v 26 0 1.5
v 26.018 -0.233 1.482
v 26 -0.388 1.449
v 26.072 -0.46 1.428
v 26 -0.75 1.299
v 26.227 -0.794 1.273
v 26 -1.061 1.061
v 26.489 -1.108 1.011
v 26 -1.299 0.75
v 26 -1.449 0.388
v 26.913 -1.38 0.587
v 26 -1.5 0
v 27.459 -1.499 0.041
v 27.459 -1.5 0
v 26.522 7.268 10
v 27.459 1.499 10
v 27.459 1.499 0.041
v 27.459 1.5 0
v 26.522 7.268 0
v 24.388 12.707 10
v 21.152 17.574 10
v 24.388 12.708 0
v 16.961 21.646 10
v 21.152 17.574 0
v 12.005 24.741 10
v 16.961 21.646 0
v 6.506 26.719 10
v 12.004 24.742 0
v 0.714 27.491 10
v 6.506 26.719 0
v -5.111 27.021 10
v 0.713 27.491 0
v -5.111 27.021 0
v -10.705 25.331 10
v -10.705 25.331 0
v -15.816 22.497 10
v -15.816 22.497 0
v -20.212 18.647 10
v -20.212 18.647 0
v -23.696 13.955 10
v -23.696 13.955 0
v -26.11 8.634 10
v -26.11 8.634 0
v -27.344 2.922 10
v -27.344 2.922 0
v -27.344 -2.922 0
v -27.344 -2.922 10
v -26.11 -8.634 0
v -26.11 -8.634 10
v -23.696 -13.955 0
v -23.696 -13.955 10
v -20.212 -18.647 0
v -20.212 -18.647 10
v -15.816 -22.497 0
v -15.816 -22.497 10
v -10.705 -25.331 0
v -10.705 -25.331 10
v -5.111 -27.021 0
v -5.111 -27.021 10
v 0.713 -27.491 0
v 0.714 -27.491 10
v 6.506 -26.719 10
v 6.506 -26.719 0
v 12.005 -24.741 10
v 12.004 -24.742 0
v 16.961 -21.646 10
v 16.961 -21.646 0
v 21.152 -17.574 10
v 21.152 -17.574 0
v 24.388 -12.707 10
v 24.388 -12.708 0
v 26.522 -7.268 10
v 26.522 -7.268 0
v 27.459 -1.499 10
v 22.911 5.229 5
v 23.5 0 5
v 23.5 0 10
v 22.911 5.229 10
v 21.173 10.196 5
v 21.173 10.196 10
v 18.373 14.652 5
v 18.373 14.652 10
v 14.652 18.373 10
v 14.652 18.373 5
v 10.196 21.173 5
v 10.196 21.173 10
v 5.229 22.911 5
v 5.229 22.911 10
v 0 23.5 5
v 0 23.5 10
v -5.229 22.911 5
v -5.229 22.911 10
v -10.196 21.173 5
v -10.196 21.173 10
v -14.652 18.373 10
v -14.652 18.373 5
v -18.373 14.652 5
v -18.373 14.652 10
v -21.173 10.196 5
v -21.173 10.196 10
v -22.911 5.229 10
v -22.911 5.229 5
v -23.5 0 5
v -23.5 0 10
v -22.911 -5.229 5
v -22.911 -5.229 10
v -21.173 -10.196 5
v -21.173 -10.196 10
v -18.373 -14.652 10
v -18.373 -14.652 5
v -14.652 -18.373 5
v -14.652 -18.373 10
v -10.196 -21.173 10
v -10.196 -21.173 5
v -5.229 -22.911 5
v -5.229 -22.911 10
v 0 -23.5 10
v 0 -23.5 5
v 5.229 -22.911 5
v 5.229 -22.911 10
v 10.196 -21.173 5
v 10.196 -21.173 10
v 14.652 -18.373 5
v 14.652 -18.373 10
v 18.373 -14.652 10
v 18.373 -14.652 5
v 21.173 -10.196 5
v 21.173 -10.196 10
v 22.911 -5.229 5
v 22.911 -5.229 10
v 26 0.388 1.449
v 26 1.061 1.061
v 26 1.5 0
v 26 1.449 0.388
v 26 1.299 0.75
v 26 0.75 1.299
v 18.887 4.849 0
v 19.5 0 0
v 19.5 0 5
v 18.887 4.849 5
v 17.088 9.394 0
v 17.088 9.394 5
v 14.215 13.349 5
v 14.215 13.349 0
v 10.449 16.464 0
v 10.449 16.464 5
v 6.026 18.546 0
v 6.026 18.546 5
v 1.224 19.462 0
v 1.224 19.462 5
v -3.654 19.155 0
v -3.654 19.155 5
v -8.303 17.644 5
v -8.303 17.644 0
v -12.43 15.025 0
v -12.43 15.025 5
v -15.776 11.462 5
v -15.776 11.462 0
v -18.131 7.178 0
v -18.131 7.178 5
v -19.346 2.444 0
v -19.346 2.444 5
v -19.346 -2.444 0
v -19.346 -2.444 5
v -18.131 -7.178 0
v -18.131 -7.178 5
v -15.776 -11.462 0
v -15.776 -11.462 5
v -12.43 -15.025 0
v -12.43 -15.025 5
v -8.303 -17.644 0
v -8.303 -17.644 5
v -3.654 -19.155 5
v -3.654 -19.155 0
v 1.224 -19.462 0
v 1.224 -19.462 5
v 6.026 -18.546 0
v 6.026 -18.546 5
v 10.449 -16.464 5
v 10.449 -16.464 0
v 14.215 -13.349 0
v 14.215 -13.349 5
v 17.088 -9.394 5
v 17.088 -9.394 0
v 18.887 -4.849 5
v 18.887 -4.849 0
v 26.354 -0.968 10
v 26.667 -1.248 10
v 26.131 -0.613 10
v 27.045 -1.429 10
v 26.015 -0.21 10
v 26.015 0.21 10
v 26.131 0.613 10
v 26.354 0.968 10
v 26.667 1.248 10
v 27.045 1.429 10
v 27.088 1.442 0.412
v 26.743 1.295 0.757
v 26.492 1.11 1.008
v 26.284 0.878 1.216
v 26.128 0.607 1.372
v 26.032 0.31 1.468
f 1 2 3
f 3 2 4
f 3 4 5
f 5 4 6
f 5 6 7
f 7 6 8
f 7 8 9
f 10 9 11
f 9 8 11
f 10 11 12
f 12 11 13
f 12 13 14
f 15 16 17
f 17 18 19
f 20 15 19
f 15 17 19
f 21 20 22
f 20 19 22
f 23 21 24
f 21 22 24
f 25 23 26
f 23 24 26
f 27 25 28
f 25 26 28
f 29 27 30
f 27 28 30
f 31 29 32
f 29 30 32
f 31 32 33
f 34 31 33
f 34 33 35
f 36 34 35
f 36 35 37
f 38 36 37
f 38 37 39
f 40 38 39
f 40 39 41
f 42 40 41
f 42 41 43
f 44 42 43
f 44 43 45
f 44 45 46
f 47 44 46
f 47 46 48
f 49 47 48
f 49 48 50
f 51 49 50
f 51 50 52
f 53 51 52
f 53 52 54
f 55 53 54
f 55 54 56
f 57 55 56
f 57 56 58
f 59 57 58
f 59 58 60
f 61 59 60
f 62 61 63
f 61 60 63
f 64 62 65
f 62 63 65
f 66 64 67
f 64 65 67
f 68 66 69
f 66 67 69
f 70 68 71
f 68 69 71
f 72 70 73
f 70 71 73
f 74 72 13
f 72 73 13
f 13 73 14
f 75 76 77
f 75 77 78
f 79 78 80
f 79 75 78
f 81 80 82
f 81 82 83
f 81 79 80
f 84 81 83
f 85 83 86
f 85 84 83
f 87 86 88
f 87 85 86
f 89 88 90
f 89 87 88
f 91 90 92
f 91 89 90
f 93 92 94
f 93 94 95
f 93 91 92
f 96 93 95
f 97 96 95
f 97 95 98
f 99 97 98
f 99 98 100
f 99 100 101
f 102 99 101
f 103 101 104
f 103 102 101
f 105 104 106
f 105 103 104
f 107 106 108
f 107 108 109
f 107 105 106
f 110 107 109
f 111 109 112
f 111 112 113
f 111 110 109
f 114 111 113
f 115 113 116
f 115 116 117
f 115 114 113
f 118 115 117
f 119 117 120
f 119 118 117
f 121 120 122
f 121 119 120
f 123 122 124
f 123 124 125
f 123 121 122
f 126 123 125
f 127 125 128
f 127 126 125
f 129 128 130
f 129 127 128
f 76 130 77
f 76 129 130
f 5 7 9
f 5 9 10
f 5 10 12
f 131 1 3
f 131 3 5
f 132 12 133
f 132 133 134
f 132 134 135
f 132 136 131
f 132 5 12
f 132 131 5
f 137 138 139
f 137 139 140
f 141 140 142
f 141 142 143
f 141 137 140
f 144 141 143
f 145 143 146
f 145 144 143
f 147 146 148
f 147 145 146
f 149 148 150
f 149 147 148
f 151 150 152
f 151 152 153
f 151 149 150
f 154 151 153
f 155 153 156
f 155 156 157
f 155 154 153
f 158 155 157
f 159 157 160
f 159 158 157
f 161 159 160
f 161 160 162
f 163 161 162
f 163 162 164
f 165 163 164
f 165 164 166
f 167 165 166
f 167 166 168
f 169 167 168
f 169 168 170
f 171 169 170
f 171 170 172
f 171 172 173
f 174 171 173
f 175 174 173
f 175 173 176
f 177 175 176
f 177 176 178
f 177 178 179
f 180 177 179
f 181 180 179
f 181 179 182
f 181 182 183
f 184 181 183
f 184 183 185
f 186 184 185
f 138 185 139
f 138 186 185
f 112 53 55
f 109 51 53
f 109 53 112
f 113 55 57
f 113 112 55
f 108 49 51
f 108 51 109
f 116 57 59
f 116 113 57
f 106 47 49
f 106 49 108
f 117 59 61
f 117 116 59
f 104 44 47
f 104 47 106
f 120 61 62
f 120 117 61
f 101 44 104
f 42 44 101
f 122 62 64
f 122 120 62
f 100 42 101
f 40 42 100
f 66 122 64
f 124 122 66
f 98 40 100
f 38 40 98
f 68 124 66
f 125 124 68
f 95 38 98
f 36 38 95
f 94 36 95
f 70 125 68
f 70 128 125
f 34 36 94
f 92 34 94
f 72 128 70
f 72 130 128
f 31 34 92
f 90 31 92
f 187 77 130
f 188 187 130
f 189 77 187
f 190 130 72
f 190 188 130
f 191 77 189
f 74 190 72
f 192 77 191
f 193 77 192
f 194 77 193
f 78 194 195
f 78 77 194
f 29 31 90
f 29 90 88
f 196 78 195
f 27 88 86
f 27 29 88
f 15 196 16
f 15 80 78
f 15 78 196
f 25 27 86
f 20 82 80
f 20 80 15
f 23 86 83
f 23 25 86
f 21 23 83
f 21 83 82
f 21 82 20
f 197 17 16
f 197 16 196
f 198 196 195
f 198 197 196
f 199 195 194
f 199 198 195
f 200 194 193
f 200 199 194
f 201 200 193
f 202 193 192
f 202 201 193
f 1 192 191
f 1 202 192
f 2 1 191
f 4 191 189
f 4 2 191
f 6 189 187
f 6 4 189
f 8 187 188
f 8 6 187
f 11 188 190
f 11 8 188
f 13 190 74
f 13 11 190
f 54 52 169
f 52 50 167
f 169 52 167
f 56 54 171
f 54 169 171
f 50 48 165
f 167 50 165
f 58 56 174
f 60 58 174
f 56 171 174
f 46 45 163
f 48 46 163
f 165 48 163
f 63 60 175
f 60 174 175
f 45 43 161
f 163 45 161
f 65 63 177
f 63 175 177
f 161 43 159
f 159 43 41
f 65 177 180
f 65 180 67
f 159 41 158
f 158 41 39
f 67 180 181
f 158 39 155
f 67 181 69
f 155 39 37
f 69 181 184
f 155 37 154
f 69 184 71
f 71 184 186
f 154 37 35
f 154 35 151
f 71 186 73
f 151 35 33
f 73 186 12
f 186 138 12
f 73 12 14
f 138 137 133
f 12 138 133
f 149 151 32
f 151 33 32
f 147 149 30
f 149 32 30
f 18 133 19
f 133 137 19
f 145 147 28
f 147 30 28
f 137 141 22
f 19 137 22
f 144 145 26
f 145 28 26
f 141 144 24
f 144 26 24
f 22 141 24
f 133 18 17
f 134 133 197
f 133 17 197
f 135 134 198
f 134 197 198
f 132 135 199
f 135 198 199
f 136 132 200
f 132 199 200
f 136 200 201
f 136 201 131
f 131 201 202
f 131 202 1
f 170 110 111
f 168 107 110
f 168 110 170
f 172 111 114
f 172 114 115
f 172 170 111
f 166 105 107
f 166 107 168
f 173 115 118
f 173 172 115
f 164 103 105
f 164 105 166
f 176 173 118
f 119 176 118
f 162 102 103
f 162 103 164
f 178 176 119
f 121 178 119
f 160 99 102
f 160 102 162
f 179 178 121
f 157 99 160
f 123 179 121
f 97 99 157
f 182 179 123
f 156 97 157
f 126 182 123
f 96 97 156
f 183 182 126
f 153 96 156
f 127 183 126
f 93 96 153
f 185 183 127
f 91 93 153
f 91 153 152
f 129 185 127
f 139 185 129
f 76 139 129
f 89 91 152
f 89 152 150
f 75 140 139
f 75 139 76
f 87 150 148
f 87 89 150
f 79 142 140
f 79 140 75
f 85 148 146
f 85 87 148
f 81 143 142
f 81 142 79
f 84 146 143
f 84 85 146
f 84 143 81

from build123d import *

# Parameters (mm, degrees)
SKETCH_R          = 27.5
SKETCH_R_2        = 19.5
PAD_DEPTH         = 10
SKETCH001_R       = 1.5
POCKET_DEPTH      = 10
SKETCH002_R       = 1.5
POCKET001_DEPTH   = 1.5
COPYSKETCH003_R   = 23.5
COPYSKETCH003_R_2 = 19.5
POCKET002_DEPTH   = 5


with BuildPart() as part:
    # Sketch → Pad (new body)
    with BuildSketch(Plane.XY):
        Circle(SKETCH_R)
        Circle(SKETCH_R_2, mode=Mode.SUBTRACT)
    extrude(amount=PAD_DEPTH)

    # Sketch001 → Pocket (cut)
    with BuildSketch(Plane(origin=(27.5, 0, 0), x_dir=(1, 0, 0), z_dir=(0, 0, 1))):
        Circle(SKETCH001_R)
    extrude(amount=POCKET_DEPTH, mode=Mode.SUBTRACT)

    # Sketch002 → Pocket001 (cut)
    with BuildSketch(Plane.YZ.offset(27.5)):
        Circle(SKETCH002_R)
    extrude(amount=-POCKET001_DEPTH, mode=Mode.SUBTRACT)

    # CopySketch003 → Pocket002 (cut)
    with BuildSketch(Plane.XY.offset(5)):
        Circle(COPYSKETCH003_R)
        Circle(COPYSKETCH003_R_2, mode=Mode.SUBTRACT)
    extrude(amount=POCKET002_DEPTH, mode=Mode.SUBTRACT)


solid = part.part
